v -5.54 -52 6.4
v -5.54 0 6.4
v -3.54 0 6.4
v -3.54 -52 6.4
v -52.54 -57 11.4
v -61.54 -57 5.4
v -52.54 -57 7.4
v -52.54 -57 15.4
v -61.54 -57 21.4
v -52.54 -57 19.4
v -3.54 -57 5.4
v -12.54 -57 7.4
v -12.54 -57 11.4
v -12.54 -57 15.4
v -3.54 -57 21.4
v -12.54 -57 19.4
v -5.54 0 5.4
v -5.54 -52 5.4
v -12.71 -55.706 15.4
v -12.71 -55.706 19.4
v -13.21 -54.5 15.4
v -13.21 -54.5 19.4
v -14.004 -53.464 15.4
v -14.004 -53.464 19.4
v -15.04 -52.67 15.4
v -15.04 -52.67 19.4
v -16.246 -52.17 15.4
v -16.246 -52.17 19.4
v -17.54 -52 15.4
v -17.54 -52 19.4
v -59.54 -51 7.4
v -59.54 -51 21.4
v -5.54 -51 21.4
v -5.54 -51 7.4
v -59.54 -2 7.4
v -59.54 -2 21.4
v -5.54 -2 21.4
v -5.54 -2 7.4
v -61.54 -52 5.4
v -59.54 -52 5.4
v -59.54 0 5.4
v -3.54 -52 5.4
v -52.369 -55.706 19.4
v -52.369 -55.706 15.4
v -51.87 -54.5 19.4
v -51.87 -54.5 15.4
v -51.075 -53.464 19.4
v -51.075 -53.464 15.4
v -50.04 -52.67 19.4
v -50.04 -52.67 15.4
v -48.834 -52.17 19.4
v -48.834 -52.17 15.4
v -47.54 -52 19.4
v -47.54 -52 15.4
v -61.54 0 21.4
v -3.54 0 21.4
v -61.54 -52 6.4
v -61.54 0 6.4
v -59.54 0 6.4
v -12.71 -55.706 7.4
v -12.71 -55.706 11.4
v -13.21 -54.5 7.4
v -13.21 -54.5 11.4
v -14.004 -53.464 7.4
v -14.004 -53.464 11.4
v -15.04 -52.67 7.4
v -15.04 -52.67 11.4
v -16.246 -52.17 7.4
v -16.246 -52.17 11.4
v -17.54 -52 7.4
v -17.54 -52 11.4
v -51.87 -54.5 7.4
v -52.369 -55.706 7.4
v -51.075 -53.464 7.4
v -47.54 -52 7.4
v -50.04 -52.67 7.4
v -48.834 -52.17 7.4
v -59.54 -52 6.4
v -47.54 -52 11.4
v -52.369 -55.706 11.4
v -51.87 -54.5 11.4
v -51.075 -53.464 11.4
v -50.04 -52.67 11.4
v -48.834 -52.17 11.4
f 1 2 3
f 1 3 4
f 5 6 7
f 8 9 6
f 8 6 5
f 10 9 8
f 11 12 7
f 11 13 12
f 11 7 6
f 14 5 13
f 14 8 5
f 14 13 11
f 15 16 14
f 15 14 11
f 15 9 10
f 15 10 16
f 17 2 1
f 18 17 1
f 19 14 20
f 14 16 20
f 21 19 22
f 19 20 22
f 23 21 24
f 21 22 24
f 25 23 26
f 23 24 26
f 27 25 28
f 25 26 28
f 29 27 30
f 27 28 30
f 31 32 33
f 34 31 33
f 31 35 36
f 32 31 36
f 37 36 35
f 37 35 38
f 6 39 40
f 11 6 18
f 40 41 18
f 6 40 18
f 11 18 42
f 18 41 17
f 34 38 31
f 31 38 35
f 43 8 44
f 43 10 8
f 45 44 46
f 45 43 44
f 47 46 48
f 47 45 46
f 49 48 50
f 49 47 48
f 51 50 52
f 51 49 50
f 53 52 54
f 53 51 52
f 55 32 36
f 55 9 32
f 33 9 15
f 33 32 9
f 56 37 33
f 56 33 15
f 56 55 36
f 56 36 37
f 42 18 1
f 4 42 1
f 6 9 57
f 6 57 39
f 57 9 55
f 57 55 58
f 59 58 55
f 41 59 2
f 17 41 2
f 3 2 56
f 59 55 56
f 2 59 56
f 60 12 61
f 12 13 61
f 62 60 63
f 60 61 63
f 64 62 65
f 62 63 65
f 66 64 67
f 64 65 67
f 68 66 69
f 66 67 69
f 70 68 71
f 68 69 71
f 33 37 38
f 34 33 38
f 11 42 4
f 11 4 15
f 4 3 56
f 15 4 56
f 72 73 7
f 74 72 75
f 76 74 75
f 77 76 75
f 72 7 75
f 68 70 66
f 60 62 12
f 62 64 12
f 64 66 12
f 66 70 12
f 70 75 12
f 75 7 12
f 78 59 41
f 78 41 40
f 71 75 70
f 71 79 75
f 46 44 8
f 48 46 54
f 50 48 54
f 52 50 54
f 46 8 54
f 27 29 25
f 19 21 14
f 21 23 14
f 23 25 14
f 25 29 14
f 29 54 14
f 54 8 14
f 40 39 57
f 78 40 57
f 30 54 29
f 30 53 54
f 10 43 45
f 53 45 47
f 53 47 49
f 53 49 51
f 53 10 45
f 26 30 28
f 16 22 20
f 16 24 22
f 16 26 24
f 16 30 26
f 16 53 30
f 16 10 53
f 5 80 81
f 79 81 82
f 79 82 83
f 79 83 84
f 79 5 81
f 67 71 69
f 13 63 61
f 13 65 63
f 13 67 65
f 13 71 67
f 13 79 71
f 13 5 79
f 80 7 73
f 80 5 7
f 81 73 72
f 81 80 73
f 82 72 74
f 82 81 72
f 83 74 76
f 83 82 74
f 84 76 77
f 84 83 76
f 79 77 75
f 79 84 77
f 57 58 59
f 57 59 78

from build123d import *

# Parameters (mm, degrees)
F1_DEPTH = 57
F0_W     = 54
F0_H     = 14
F2_DEPTH = 2
F3_START = 51
F3_DEPTH = 6
F4_W     = 40
F4_H     = 4
F5_DEPTH = 5
F6_R     = 4.99999
F7_W     = 52
F7_H     = 1
F8_DEPTH = 2
F9_START = -56
F9_DEPTH = 2


# Not quite as in the source:
# - a fillet or chamfer is up to 0.001 mm smaller than in the source, because OpenCascade refuses the exact size


with BuildPart() as f1:
    # F0 (on Front) → F1 (new body)
    with BuildSketch(Plane.XZ):
        Polygon((-59.5397581918, 21.3998371276), (-61.5397581918, 21.3998371276), (-61.5397581918, 5.3998371276), (-3.5397581918, 5.3998371276), (-3.5397581918, 21.3998371276), (-5.5397581918, 21.3998371276), (-5.5397581918, 7.3998371276), (-59.5397581918, 7.3998371276), align=None)
    extrude(amount=F1_DEPTH)

    # F0 (on Front) → F2 (join)
    with BuildSketch(Plane.XZ):
        with Locations((-32.5397581918, 14.3998371276)):
            Rectangle(F0_W, F0_H)
    extrude(amount=F2_DEPTH)

    # F0 (on Front) → F3 (join)
    with BuildSketch(Plane.XZ.offset(F3_START)):
        with Locations((-32.5397581918, 14.3998371276)):
            Rectangle(F0_W, F0_H)
    extrude(amount=F3_DEPTH)

    # F4 (on face) → F5 (cut)
    with BuildSketch(Plane.XZ.offset(57)):
        with Locations((-32.5397581918, 17.3998371276)):
            Rectangle(F4_W, F4_H)
        with Locations((-32.5397581918, 9.3998371276)):
            Rectangle(F4_W, F4_H)
    extrude(amount=-F5_DEPTH, mode=Mode.SUBTRACT)

    # F6 (radius 5 in the source; OpenCascade refuses exactly that, so slightly less here)
    f6_edges = [f1.edges().sort_by_distance(p)[0] for p in [
        (-52.539758, -52, 17.399837),
        (-52.539758, -52, 9.399837),
        (-12.539758, -52, 17.399837),
        (-12.539758, -52, 9.399837),
    ]]
    fillet(f6_edges, radius=F6_R)

    # F7 (on face) → F8 (cut)
    with BuildSketch(Plane(origin=(-61.5397581918, 0, 0), x_dir=(0, -1, 0), z_dir=(-1, 0, 0))):
        with Locations((26, 5.8998371276)):
            Rectangle(F7_W, F7_H)
    extrude(amount=-F8_DEPTH, mode=Mode.SUBTRACT)

    # F7 (on face) → F9 (cut)
    with BuildSketch(Plane(origin=(-61.5397581918, 0, 0), x_dir=(0, -1, 0), z_dir=(-1, 0, 0)).offset(F9_START)):
        with Locations((26, 5.8998371276)):
            Rectangle(F7_W, F7_H)
    extrude(amount=-F9_DEPTH, mode=Mode.SUBTRACT)


solid = f1.part
